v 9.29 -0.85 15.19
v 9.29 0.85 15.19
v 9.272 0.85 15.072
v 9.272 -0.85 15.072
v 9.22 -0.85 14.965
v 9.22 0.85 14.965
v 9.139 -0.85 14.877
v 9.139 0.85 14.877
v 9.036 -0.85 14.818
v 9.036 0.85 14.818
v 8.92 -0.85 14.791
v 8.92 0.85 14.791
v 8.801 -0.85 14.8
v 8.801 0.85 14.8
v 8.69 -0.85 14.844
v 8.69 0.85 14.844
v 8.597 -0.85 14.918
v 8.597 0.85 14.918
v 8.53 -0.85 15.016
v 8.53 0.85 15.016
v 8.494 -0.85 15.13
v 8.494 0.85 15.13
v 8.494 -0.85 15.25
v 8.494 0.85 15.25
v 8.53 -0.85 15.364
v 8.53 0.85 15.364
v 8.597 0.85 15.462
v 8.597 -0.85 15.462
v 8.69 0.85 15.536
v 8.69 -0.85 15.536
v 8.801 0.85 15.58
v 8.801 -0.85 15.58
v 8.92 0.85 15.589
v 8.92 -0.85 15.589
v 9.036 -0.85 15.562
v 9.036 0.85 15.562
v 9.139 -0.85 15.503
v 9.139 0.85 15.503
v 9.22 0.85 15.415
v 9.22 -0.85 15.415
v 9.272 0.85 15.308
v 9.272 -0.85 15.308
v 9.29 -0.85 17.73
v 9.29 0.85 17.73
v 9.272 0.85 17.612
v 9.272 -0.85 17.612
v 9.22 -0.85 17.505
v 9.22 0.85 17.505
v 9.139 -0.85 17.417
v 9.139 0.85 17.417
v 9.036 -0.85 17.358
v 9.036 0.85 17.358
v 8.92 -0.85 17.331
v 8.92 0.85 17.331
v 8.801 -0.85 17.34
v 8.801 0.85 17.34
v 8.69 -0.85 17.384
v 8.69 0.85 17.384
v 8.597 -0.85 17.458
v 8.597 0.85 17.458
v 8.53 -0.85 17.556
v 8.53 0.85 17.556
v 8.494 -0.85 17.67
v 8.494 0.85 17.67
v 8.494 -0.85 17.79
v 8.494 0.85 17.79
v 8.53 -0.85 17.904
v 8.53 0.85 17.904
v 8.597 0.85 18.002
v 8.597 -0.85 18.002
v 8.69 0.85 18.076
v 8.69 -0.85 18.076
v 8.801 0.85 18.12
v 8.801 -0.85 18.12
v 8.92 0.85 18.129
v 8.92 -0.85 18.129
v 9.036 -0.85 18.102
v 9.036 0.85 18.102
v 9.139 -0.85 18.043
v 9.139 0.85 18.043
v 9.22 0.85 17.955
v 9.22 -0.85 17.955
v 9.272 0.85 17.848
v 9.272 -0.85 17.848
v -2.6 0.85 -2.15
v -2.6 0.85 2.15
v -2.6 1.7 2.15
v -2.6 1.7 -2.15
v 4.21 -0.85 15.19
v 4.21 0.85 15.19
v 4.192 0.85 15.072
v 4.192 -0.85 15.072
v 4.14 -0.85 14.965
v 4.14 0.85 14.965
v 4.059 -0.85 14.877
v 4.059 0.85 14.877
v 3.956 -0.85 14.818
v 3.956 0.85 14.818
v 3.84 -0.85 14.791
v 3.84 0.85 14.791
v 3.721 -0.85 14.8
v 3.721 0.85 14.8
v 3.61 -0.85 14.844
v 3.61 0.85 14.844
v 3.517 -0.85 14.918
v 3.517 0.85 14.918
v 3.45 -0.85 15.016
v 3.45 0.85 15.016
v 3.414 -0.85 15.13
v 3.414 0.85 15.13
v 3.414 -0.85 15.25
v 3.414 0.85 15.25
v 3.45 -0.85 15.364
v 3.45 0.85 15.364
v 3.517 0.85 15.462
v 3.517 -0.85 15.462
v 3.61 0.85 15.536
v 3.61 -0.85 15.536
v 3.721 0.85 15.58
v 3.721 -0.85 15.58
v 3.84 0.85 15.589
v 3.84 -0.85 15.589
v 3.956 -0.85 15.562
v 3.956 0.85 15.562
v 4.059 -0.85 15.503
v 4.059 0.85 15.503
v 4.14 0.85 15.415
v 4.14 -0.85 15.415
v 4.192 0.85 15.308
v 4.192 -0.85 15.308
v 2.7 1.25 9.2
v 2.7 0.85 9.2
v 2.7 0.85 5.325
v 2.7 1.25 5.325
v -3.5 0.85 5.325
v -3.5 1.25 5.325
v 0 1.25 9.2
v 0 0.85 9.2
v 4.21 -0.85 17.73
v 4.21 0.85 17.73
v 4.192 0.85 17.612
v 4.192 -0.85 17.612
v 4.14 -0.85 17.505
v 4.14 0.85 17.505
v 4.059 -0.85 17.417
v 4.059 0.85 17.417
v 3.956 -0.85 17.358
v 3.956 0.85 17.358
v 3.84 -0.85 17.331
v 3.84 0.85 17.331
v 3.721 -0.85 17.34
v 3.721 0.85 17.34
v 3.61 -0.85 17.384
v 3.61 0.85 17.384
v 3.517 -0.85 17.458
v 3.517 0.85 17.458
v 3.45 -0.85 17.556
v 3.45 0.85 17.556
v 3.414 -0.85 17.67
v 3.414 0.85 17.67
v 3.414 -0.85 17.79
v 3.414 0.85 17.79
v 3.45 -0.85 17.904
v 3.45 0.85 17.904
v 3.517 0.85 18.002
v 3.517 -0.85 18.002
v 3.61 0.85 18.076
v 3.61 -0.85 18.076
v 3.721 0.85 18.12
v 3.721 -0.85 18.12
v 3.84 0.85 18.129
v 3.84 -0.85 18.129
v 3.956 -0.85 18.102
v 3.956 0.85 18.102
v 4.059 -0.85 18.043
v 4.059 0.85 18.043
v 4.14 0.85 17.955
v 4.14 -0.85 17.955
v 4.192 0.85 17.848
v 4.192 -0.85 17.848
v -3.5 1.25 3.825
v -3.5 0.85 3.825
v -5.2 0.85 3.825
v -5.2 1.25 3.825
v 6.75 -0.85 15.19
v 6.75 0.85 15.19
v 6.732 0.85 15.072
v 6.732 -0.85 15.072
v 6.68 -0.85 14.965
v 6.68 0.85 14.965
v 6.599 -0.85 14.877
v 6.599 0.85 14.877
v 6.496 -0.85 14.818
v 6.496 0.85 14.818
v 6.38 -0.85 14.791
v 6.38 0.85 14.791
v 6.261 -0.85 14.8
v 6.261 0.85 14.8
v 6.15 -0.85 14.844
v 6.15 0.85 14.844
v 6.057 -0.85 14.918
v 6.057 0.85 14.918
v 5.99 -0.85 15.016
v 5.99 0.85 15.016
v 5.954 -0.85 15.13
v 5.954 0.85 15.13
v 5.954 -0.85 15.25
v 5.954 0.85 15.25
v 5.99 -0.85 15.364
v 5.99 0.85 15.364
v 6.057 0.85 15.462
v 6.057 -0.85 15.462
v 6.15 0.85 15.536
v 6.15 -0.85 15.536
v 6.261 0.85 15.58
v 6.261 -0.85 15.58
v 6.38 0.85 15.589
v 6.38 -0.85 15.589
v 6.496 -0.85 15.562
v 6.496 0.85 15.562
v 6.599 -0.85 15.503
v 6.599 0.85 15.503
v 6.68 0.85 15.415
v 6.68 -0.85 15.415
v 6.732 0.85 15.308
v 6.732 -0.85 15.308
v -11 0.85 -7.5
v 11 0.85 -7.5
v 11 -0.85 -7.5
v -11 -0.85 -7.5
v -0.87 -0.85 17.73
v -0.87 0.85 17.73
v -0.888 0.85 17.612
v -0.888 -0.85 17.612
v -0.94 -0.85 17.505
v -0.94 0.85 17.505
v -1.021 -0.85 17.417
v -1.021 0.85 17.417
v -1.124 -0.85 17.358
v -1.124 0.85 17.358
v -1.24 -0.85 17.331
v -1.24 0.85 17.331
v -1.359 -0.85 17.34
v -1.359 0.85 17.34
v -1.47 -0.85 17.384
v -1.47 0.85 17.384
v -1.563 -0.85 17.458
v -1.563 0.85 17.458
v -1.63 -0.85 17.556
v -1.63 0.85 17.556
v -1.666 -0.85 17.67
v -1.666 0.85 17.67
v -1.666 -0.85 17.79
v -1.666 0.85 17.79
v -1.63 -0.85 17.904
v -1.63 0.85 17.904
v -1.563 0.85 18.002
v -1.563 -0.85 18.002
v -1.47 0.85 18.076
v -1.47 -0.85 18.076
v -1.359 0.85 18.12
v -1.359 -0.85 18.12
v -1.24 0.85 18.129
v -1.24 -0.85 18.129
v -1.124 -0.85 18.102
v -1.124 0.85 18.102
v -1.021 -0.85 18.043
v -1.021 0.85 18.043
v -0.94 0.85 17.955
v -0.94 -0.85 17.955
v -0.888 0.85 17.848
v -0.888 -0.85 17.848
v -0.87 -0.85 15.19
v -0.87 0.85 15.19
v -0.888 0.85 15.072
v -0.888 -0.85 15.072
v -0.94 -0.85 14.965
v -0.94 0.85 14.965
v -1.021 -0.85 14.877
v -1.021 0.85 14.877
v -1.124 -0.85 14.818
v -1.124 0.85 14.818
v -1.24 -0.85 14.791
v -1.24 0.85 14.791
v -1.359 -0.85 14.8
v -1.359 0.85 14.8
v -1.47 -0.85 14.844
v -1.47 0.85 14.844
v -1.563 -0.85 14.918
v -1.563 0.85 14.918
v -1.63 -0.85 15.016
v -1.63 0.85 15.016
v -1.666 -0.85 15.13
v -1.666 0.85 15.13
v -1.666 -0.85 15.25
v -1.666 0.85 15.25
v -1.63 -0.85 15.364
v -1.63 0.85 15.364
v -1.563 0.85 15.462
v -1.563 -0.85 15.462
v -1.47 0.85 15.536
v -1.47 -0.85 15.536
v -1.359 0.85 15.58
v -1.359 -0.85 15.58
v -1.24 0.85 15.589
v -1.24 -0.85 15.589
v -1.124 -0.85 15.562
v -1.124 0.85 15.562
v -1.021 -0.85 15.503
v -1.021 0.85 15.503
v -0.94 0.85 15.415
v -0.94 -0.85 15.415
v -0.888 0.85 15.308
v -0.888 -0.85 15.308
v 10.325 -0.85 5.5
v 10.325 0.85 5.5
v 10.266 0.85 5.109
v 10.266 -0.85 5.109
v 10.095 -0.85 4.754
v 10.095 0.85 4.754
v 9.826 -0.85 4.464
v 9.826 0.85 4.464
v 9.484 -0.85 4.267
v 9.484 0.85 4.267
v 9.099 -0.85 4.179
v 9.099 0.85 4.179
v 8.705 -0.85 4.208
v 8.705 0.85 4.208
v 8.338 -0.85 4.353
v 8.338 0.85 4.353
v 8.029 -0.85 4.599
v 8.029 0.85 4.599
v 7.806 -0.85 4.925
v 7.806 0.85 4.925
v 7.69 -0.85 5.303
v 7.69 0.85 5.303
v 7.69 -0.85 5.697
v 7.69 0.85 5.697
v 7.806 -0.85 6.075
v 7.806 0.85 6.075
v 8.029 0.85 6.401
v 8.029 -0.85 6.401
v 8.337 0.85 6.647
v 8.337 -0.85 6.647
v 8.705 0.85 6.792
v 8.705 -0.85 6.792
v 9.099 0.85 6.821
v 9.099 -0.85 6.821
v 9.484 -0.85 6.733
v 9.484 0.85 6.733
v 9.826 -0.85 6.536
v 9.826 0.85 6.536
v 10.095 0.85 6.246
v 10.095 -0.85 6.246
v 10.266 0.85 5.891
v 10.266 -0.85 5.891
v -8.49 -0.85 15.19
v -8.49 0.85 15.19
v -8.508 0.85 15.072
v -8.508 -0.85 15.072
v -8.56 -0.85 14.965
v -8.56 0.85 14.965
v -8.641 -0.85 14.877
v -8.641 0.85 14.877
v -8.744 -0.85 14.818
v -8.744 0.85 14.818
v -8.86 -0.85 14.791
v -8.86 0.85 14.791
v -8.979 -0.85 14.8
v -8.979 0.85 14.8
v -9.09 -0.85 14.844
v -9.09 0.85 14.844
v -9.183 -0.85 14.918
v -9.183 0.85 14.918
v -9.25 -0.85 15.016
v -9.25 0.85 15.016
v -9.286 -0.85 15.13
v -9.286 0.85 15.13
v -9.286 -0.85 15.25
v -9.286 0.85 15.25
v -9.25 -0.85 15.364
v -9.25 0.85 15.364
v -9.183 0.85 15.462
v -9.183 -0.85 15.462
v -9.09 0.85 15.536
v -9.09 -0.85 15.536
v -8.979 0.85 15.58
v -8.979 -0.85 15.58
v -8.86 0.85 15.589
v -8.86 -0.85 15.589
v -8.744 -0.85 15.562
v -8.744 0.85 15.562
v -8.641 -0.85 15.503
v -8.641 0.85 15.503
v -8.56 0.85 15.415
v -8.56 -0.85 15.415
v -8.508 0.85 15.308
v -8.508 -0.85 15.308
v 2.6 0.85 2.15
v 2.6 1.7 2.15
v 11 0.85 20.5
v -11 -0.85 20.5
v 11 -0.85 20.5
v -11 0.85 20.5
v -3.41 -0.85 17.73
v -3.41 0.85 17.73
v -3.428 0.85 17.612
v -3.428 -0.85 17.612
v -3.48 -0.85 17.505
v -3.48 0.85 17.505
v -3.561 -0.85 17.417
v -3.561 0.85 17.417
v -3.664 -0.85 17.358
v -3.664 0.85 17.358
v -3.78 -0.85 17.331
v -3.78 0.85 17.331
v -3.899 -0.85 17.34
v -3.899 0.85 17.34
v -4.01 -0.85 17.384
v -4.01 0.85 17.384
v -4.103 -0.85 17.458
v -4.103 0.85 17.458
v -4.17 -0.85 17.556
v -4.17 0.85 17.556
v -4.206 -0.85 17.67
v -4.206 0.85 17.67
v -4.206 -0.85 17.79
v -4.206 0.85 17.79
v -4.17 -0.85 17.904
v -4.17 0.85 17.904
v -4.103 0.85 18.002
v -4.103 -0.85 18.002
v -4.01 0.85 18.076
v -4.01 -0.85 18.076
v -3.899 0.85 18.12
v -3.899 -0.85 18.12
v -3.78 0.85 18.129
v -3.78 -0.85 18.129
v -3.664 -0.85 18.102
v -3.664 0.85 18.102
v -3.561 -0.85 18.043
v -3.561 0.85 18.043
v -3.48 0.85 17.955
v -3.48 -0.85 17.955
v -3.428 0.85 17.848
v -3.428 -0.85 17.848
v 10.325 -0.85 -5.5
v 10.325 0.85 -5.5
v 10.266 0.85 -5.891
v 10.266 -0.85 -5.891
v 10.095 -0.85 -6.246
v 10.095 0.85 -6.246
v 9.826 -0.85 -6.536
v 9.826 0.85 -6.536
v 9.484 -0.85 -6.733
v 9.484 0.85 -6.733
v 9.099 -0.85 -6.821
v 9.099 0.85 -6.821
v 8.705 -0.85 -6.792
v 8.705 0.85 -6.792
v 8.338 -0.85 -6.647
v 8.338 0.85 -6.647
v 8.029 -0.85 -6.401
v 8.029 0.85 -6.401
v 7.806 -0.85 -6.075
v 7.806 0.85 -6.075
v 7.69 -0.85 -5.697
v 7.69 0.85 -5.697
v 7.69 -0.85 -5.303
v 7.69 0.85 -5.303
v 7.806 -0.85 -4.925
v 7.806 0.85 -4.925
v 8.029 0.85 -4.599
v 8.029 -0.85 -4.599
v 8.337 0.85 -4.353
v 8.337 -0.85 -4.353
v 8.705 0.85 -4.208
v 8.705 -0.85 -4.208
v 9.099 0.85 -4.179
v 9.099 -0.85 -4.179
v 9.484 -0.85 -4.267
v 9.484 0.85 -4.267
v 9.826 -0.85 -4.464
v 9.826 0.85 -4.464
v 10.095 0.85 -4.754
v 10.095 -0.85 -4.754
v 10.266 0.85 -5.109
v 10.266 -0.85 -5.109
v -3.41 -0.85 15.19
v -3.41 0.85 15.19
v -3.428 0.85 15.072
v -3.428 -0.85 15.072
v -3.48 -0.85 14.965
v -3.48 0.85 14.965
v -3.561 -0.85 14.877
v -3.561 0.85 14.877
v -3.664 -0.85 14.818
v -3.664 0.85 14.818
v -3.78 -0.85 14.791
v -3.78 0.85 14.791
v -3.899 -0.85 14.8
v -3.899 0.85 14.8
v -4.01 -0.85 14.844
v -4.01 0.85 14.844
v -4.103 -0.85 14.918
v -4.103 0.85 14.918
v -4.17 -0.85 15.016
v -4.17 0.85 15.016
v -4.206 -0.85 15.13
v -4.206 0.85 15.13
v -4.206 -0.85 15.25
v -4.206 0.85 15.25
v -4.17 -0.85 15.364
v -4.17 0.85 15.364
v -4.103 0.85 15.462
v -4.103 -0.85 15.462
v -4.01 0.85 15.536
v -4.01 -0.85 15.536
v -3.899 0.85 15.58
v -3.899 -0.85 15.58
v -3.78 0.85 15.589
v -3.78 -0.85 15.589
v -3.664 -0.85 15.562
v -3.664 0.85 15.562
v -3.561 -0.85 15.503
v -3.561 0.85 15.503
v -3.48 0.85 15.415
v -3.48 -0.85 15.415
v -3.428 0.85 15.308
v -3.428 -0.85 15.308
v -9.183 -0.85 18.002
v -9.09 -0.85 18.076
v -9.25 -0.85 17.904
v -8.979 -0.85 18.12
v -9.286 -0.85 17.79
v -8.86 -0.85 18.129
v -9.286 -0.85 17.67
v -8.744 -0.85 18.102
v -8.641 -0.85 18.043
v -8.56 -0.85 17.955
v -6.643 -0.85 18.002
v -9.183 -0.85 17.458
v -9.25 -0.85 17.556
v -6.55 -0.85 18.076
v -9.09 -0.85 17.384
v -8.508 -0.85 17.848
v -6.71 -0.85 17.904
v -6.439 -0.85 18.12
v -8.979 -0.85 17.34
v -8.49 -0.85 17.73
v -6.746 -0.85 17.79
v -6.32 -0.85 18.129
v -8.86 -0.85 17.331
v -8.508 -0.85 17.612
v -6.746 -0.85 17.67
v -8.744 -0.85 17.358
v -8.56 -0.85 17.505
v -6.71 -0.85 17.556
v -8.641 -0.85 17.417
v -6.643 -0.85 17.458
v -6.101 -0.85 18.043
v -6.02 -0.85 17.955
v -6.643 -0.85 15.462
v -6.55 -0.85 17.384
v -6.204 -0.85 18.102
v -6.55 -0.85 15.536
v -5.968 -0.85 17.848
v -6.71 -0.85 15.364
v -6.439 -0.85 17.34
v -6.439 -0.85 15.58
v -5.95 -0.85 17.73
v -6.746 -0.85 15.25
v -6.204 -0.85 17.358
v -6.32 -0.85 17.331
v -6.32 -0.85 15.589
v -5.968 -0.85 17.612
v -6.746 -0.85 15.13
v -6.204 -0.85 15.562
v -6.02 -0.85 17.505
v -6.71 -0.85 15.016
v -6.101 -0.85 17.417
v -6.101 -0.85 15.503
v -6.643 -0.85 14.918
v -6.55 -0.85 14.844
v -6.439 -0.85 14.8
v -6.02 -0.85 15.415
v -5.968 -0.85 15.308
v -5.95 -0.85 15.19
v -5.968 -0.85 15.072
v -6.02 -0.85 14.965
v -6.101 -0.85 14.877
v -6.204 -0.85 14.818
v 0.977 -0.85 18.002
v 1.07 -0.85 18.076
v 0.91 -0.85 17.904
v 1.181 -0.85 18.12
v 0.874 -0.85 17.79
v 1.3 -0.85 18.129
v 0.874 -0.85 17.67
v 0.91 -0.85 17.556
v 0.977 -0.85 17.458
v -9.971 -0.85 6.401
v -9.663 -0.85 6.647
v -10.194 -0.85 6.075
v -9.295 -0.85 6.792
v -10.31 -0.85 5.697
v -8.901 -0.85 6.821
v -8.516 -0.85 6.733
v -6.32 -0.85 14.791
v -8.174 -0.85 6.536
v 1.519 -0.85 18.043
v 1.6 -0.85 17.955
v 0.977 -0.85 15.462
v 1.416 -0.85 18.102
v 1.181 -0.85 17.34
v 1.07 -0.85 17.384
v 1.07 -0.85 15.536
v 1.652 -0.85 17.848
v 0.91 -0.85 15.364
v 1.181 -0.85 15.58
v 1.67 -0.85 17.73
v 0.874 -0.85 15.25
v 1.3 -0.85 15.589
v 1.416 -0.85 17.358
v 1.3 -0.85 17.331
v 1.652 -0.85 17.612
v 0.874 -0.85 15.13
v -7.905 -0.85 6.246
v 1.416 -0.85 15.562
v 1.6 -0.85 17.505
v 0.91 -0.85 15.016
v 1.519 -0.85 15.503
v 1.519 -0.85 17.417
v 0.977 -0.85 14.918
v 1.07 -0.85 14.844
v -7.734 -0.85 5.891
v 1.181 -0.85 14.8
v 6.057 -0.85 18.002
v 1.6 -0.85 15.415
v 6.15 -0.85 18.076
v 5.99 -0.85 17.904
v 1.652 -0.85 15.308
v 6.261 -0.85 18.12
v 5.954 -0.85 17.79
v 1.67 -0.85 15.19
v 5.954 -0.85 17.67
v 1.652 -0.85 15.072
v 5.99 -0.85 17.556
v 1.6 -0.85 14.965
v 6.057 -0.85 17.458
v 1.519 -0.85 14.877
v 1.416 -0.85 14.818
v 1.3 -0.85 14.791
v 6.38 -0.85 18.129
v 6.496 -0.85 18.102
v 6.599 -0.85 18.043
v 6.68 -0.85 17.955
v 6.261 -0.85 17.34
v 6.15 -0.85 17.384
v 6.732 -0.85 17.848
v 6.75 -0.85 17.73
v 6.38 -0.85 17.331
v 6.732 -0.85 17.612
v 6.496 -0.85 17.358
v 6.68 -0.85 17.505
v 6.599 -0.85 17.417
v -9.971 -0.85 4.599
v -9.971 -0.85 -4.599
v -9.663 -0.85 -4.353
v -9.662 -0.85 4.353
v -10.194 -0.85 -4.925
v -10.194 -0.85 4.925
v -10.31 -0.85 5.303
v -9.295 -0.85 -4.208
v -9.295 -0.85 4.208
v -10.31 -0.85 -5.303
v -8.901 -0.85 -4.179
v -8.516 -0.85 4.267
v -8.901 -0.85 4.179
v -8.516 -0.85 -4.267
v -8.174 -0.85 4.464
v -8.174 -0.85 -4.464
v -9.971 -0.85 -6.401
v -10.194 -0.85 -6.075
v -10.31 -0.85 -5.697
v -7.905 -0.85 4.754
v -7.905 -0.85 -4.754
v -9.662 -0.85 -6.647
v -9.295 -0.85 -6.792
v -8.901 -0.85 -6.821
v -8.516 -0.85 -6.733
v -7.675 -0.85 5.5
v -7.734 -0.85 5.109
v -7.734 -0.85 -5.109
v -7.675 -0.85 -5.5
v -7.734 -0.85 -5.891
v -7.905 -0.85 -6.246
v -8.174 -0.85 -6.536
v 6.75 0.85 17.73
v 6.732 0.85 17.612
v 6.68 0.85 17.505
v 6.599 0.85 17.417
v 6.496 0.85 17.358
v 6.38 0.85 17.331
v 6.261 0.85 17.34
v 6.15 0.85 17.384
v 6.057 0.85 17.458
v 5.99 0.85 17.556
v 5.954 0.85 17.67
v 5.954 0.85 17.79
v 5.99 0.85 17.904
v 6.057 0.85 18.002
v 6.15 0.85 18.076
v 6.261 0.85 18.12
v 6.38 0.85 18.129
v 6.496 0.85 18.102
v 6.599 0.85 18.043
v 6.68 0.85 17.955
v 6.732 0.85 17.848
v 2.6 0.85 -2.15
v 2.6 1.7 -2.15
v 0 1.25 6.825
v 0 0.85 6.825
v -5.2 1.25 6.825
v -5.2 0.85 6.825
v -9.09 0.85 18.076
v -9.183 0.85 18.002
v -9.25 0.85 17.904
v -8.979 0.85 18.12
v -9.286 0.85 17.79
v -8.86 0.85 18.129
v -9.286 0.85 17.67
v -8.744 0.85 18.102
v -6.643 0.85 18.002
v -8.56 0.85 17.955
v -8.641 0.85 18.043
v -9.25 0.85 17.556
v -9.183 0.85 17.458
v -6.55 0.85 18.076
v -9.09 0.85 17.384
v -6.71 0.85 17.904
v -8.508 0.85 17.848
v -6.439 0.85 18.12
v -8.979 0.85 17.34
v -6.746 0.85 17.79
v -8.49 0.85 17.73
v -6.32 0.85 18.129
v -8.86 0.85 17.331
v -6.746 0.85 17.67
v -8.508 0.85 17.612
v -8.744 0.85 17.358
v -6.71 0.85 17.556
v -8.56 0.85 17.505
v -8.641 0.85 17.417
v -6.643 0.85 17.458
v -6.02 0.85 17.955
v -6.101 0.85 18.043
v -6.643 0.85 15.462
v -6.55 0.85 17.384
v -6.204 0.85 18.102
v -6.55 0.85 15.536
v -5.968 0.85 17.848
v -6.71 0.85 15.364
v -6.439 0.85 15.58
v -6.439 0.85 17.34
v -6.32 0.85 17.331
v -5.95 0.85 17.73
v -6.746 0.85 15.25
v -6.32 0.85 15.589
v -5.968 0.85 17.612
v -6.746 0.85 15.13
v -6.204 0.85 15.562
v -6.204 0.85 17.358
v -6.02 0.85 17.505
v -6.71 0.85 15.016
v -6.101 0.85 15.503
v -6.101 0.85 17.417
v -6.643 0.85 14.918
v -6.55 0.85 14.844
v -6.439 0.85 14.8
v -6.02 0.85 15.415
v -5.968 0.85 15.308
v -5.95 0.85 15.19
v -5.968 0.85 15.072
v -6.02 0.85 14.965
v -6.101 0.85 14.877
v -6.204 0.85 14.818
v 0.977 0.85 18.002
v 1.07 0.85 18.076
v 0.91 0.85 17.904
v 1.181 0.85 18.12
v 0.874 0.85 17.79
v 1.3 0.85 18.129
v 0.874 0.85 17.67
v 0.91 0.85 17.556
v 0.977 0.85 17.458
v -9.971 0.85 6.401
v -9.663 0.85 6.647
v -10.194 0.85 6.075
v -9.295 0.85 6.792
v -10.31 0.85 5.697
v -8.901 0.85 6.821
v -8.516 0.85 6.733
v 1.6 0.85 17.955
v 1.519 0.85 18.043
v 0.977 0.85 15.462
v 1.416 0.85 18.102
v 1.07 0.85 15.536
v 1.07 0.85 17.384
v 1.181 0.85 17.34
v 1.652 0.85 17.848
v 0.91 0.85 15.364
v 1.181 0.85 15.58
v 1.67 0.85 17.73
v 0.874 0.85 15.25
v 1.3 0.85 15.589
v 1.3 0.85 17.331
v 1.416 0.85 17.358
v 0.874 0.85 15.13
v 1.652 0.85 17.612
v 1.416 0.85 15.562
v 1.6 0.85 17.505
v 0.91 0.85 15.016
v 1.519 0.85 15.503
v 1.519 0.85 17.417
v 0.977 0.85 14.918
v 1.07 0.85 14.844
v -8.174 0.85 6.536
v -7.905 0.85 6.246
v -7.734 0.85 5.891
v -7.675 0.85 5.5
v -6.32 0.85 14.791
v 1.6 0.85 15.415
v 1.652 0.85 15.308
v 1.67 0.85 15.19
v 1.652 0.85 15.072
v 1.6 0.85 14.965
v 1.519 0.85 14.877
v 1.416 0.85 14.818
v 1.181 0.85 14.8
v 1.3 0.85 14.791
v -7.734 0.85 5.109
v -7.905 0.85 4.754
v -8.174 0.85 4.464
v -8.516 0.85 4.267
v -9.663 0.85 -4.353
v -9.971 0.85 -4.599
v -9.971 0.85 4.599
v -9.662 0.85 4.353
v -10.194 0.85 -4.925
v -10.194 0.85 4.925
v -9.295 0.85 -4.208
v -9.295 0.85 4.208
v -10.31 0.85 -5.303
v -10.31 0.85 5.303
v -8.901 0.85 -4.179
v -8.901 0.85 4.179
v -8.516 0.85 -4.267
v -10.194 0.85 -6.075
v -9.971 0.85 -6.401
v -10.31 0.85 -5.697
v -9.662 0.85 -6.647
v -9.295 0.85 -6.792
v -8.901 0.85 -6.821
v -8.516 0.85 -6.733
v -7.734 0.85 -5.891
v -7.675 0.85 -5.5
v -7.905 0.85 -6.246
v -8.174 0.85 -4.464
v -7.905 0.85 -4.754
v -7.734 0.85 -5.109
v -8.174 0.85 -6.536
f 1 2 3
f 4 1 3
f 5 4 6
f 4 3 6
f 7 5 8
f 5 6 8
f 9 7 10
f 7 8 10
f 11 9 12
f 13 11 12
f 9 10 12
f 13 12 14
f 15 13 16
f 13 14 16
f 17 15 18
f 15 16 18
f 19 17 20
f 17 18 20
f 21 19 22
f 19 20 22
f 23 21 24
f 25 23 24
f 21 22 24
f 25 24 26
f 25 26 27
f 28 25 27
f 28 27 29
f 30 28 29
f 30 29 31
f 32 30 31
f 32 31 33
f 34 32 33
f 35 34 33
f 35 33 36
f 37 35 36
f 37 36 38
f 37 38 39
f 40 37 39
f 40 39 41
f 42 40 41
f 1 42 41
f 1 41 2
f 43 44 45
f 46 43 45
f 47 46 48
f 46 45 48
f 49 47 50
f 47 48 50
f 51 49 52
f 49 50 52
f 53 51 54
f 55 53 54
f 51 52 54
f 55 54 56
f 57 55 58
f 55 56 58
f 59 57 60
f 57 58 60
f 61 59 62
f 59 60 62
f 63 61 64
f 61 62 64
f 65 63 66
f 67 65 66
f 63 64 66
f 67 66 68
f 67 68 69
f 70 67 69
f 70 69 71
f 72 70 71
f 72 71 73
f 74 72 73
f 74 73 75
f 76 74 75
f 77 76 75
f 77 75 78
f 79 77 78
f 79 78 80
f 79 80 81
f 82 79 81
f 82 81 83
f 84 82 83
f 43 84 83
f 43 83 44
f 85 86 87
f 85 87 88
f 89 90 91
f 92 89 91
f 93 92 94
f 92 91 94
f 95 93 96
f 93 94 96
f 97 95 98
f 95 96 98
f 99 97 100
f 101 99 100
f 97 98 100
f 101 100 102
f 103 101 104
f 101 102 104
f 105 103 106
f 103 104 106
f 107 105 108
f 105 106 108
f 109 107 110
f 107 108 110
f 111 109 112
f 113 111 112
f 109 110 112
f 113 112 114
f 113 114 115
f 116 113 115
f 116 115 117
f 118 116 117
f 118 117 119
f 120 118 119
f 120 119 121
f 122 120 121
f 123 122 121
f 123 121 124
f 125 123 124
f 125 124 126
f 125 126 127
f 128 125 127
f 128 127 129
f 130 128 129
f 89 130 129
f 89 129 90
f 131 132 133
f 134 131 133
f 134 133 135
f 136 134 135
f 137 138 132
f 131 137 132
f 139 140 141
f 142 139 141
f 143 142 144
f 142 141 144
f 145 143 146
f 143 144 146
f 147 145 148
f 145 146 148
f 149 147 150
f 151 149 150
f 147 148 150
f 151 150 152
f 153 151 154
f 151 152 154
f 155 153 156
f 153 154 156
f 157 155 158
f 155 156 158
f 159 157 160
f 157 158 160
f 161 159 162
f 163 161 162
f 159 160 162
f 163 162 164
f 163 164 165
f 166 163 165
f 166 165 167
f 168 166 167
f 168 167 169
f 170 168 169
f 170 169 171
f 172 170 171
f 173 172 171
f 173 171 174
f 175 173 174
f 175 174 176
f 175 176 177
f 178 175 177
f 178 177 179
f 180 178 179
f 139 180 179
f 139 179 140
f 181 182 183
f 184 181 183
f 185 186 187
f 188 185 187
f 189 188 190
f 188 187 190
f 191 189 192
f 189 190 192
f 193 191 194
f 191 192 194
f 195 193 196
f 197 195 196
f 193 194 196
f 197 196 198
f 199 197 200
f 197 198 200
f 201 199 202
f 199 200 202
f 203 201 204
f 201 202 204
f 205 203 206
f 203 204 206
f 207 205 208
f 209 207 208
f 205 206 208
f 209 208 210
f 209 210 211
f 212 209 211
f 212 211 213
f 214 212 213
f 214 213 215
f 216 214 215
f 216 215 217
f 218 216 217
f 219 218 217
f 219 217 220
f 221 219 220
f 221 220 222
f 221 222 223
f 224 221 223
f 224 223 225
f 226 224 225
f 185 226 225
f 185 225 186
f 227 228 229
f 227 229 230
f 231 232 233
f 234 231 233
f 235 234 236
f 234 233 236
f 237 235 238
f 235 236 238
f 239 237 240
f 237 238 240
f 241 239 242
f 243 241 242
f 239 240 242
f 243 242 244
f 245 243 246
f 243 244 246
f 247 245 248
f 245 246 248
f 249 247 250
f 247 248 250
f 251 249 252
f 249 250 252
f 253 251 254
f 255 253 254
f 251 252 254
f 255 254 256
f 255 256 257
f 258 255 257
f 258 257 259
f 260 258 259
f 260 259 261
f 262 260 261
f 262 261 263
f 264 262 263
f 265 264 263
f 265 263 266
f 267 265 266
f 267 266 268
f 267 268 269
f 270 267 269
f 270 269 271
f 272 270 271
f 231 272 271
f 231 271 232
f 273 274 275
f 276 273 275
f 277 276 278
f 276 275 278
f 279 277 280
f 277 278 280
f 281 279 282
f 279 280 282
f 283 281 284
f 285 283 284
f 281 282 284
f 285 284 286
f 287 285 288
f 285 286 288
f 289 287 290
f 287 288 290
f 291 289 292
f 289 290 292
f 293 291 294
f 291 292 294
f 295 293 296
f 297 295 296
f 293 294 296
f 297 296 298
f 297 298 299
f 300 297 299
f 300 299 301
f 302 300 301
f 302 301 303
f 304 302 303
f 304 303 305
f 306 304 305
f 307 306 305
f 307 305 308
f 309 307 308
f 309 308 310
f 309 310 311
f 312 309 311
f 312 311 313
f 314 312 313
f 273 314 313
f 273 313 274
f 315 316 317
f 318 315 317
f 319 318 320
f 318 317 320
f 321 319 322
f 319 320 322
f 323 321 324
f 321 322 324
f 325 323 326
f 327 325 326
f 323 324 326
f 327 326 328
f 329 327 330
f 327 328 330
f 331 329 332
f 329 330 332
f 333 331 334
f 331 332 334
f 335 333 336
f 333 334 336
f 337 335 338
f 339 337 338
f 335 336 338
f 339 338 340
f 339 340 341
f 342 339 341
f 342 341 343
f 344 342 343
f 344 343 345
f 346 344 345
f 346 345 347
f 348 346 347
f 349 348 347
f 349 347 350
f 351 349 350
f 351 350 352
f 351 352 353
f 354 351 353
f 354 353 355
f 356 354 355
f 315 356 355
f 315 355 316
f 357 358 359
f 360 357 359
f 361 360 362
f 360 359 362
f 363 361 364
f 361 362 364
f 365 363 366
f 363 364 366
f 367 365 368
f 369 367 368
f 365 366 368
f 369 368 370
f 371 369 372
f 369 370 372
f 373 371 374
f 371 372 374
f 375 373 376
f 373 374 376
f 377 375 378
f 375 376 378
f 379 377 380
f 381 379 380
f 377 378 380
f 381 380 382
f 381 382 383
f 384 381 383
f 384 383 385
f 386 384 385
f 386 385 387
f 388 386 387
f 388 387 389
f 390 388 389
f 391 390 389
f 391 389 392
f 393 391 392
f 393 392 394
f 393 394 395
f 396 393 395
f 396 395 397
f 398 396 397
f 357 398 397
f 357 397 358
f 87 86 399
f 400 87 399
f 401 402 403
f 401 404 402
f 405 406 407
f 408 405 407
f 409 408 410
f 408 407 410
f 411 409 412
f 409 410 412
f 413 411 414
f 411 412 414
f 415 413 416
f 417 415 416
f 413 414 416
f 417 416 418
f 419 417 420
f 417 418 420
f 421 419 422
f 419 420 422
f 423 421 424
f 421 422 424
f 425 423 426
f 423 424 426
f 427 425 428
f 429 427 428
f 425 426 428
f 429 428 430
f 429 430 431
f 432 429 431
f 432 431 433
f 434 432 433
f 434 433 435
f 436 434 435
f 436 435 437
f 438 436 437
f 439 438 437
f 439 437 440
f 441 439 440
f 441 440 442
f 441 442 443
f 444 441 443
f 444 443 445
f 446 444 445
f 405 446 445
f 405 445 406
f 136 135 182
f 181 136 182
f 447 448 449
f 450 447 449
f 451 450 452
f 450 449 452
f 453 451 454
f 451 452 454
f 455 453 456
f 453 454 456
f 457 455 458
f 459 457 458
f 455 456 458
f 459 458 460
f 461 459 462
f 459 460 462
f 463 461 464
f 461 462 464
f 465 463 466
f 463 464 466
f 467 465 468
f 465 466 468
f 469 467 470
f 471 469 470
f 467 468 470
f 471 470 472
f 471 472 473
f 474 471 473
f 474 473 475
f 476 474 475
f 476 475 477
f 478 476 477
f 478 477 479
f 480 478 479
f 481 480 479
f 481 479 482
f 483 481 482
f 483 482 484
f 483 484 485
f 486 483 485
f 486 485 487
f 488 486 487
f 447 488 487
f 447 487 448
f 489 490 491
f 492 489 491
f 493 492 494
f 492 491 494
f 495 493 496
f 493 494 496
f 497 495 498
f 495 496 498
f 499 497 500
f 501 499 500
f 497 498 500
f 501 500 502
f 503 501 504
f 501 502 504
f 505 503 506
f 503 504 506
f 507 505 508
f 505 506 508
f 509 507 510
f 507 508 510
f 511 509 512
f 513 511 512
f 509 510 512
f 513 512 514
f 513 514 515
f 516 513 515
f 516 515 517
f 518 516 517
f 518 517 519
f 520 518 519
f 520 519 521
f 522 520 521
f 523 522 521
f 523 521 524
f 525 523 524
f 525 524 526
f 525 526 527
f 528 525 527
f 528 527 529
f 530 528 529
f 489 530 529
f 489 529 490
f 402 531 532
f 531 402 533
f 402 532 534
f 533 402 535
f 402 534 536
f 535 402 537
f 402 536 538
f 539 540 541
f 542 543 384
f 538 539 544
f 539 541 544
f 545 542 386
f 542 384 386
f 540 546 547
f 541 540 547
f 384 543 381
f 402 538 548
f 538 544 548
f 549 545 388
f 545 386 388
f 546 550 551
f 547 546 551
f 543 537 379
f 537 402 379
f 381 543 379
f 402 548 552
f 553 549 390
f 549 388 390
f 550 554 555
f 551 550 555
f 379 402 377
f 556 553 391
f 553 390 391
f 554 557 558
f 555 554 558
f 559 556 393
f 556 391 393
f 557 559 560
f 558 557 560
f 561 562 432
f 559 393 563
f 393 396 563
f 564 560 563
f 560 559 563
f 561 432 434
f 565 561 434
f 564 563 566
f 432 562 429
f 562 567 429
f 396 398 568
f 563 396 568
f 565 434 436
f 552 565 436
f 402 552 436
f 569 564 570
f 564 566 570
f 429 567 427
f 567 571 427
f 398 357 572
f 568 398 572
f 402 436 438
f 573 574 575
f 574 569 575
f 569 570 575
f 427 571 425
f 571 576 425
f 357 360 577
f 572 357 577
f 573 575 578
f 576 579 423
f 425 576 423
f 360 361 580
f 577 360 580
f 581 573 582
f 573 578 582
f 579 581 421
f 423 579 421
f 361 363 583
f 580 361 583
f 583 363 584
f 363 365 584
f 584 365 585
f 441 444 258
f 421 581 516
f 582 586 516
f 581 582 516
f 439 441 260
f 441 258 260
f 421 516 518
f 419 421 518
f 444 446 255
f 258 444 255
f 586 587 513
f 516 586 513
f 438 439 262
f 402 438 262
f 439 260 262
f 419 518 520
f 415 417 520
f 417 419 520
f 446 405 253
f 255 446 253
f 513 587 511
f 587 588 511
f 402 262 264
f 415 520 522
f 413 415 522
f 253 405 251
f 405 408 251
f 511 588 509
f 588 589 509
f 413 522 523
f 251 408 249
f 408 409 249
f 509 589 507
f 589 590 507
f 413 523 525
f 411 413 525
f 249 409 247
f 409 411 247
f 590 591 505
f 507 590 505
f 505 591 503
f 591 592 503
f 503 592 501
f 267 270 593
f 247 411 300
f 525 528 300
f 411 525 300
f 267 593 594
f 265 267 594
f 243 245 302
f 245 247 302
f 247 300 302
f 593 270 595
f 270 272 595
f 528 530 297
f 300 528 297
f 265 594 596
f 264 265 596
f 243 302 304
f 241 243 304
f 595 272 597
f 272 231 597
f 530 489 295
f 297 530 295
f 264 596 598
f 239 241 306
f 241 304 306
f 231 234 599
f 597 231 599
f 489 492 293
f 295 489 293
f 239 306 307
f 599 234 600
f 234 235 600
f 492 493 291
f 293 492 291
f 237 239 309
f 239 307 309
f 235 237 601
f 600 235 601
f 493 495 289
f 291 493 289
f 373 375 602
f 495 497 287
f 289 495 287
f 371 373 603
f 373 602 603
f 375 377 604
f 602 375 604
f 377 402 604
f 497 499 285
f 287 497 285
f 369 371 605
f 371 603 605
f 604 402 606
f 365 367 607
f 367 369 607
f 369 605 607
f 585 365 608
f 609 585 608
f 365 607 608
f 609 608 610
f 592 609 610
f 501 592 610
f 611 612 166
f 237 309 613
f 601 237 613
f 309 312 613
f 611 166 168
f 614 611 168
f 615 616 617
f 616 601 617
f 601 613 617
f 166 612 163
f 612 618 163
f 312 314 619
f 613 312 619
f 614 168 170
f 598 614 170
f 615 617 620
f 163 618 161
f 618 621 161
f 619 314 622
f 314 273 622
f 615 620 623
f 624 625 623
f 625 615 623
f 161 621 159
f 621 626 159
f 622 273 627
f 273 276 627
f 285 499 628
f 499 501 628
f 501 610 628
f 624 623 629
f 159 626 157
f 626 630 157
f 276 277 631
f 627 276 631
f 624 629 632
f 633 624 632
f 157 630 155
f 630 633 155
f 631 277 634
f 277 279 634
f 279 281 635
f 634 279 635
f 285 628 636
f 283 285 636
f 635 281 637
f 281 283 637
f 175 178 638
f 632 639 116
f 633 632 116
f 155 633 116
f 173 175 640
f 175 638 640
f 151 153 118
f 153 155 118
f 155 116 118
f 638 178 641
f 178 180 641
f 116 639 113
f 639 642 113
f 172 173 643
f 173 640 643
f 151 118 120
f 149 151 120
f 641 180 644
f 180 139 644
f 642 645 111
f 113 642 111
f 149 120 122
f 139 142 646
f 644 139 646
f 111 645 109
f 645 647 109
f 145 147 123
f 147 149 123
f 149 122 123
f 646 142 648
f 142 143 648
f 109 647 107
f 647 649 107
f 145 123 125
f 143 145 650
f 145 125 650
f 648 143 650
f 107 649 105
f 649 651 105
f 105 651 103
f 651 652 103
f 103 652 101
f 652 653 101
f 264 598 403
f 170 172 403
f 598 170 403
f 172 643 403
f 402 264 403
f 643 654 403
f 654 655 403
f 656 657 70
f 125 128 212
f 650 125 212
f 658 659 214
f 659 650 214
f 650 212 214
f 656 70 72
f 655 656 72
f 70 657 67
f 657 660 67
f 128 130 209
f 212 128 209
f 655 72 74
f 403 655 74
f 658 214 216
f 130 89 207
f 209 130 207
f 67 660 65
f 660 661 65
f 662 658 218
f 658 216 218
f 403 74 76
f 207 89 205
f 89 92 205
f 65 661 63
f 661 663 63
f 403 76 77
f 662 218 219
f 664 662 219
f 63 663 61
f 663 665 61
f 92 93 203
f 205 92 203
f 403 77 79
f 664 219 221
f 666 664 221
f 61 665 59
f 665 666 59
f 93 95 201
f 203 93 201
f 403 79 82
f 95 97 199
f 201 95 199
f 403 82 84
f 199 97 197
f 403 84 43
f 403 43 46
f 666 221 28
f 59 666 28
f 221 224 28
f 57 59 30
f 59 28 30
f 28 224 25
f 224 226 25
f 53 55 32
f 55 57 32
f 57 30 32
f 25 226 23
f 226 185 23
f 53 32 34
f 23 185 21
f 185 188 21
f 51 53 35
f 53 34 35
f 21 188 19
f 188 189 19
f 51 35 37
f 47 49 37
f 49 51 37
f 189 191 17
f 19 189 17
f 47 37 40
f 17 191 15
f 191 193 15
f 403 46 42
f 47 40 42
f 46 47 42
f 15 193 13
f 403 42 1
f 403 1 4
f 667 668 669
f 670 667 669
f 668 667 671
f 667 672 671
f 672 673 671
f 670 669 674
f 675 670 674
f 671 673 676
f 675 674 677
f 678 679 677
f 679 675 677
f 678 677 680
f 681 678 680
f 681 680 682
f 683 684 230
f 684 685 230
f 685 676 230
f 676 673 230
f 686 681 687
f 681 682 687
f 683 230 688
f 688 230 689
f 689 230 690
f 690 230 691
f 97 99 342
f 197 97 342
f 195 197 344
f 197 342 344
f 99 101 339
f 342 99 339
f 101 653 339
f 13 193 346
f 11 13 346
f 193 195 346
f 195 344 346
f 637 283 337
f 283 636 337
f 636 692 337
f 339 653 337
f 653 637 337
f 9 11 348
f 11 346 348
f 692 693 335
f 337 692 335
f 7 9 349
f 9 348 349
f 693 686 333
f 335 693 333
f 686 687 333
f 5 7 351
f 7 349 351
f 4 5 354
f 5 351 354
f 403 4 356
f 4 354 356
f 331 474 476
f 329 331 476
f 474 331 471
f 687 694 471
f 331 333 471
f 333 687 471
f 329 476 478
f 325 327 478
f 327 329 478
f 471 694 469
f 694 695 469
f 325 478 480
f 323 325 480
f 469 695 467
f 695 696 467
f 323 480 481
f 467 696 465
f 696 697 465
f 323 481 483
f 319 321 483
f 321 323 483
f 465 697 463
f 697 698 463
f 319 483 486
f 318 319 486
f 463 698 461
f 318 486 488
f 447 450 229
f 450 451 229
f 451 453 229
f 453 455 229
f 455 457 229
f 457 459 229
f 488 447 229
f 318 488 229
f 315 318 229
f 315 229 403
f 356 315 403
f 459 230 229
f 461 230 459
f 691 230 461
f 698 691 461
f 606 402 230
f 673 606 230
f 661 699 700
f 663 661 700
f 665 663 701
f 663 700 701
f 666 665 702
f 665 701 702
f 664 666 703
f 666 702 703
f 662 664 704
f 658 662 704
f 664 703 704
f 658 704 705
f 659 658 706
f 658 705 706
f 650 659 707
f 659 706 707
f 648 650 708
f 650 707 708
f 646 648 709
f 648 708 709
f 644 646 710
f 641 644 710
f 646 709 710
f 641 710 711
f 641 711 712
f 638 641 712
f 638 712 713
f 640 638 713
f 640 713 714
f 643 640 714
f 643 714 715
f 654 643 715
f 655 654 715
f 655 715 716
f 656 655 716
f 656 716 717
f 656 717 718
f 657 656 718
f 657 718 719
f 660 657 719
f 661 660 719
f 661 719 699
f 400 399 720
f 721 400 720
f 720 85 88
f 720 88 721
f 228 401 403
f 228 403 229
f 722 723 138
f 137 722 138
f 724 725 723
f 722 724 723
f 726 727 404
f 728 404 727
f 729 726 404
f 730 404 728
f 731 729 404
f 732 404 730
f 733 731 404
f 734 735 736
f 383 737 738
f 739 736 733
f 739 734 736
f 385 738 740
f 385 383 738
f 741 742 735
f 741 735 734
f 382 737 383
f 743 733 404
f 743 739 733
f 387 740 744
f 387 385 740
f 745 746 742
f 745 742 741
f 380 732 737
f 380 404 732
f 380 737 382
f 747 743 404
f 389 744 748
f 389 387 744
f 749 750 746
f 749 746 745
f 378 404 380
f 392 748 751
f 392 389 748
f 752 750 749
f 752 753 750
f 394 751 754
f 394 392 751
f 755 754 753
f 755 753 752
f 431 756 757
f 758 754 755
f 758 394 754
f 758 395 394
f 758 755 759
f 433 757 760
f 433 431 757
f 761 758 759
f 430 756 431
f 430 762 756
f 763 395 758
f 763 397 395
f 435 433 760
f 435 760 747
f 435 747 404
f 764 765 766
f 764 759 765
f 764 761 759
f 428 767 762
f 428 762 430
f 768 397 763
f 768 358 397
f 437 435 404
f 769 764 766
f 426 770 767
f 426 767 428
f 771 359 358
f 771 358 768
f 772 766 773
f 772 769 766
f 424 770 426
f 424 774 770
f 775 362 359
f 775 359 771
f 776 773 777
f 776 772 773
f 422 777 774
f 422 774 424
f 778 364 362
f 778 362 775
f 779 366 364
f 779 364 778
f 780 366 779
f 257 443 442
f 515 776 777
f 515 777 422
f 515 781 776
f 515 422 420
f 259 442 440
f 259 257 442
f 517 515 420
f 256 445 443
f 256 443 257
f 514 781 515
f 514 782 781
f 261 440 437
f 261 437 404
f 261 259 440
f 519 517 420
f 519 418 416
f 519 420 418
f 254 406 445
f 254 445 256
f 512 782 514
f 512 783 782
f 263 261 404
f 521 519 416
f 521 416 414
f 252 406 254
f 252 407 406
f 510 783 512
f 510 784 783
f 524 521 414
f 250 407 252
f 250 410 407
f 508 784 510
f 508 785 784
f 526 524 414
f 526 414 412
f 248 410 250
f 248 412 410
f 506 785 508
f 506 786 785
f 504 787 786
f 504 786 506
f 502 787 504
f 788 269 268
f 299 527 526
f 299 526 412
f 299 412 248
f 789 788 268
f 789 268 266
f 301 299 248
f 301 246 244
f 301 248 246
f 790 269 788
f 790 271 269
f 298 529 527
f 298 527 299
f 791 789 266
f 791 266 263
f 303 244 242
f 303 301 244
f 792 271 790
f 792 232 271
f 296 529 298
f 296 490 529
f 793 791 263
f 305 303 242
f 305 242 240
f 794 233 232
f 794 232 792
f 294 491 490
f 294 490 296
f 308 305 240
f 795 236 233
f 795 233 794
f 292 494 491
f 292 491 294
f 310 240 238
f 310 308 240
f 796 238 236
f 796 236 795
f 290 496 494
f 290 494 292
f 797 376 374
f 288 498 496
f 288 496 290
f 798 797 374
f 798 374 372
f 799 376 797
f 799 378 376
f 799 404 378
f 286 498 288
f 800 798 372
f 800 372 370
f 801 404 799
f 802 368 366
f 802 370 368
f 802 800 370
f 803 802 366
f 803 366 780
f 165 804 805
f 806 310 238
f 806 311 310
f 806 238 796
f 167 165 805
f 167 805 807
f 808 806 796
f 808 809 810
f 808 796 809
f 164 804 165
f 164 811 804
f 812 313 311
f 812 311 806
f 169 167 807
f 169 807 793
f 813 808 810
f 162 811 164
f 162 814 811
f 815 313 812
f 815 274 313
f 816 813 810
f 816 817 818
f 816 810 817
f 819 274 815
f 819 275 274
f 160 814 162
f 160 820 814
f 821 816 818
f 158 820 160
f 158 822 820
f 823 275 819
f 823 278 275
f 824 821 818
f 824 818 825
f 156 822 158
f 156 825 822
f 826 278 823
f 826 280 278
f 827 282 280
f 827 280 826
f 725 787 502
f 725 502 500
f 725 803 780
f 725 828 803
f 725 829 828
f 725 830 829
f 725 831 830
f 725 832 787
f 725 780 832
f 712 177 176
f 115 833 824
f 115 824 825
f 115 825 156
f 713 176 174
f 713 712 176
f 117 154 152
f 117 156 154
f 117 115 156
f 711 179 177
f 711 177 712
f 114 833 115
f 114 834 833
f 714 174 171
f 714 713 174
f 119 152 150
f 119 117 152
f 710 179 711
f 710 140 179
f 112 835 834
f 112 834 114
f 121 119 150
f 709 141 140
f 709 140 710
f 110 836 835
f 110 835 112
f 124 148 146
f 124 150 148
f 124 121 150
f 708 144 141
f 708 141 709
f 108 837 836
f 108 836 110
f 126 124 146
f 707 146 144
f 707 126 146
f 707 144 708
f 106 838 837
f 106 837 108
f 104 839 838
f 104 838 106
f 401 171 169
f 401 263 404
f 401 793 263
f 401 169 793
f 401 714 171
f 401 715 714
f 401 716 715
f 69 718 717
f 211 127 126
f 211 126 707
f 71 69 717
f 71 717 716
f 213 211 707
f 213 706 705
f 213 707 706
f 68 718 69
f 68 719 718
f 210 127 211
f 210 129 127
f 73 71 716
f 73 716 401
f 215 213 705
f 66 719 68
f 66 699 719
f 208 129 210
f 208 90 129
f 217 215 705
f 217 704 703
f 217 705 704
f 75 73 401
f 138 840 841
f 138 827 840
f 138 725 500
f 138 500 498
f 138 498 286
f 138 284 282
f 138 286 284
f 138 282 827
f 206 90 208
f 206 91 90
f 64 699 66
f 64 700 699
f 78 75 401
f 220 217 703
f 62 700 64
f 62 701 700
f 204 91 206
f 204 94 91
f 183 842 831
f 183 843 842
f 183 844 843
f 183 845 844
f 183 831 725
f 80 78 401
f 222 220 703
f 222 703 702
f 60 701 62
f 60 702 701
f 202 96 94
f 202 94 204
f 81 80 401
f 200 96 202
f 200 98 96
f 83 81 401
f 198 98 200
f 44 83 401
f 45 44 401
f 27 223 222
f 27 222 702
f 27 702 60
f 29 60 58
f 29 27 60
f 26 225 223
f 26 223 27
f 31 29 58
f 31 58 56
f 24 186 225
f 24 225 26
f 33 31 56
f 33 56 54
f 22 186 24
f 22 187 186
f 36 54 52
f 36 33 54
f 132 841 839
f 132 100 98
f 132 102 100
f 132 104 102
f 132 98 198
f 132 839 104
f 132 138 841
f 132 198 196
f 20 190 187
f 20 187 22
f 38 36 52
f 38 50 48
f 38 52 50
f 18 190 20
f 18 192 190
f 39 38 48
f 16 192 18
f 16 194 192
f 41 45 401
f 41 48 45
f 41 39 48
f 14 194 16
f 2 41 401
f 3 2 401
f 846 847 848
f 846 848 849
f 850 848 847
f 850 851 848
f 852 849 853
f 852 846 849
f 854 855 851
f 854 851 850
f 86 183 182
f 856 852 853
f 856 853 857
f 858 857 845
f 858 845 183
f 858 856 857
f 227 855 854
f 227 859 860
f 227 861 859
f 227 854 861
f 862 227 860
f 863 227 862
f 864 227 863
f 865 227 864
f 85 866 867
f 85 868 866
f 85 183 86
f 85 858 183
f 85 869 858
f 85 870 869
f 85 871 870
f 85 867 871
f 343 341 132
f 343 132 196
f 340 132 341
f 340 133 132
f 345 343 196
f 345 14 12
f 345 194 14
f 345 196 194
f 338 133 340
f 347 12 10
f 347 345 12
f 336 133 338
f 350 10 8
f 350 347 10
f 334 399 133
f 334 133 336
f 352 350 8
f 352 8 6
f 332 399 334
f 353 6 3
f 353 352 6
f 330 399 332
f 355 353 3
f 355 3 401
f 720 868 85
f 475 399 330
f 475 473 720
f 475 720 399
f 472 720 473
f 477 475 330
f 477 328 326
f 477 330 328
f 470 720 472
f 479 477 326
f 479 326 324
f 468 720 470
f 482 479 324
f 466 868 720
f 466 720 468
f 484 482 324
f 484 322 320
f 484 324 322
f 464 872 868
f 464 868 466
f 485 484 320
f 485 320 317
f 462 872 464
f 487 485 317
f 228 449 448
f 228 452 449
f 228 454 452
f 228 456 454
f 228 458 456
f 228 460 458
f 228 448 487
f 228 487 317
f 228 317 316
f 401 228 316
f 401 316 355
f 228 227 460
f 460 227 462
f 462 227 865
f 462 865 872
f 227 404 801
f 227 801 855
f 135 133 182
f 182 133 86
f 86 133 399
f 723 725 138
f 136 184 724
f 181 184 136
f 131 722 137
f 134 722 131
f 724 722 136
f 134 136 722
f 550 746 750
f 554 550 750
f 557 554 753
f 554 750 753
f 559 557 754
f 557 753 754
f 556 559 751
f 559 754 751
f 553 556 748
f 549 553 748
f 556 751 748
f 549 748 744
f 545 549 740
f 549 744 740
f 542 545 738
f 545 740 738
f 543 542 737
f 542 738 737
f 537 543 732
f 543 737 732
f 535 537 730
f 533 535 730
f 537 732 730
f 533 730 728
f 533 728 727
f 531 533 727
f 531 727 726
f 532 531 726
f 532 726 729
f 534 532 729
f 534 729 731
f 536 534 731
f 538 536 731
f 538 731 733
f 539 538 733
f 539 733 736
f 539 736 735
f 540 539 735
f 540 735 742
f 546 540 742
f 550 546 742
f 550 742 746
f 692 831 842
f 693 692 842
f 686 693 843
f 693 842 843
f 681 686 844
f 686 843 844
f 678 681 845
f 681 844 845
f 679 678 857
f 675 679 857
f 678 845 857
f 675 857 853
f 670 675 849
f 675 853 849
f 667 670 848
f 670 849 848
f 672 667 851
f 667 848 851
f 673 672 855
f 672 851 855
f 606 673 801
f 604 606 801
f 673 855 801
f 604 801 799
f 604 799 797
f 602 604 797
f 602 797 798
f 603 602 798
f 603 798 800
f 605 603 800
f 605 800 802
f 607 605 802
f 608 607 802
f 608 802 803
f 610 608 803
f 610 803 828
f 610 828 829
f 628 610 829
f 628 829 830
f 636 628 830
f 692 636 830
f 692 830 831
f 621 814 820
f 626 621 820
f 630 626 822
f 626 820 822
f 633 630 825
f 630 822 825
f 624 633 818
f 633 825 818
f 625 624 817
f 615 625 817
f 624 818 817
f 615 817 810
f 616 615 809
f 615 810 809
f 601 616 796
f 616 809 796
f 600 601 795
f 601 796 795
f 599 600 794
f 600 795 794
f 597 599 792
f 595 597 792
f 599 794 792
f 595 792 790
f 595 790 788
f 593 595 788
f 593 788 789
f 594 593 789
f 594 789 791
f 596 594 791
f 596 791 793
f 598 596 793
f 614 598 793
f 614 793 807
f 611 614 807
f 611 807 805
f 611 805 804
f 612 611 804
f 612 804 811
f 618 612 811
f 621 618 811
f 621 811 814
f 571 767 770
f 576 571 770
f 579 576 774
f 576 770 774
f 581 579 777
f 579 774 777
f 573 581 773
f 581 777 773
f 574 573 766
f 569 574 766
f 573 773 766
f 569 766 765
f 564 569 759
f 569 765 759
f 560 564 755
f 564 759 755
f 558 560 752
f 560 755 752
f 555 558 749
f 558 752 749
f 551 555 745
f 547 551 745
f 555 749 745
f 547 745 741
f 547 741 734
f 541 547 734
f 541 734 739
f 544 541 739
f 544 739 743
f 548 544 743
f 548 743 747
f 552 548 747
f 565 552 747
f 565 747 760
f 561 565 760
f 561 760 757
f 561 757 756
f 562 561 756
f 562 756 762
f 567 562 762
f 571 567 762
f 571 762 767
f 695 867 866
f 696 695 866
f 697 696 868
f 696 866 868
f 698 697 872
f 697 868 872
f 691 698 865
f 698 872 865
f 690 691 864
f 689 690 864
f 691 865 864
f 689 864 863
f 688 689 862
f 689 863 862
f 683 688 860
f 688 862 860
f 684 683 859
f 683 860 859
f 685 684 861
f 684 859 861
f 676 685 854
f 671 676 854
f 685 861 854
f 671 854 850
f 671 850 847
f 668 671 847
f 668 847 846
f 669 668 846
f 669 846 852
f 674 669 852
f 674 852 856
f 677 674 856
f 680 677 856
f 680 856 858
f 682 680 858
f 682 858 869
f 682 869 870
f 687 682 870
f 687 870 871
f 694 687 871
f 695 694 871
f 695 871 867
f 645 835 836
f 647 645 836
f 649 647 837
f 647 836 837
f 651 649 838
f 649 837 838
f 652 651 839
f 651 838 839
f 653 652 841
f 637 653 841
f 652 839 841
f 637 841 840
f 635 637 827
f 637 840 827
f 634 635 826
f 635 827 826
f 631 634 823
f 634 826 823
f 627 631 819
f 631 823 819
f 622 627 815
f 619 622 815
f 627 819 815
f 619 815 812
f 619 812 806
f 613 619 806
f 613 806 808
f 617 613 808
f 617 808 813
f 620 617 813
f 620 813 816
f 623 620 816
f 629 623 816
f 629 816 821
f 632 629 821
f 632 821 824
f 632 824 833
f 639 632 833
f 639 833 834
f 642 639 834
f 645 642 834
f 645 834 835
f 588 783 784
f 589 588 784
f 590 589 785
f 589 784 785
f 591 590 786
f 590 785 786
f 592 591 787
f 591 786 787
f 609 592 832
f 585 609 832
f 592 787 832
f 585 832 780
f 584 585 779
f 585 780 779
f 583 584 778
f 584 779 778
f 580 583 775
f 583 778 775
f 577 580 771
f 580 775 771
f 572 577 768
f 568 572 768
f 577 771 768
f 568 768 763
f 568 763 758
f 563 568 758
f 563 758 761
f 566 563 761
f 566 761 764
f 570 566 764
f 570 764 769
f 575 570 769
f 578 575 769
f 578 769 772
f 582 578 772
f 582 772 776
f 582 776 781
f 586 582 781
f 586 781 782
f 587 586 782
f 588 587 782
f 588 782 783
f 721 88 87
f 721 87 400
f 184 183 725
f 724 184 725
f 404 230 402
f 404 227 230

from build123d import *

# Parameters (mm, degrees)
BOSS_EXTRUDE1_DEPTH = 0.85
SKETCH2_R           = 1.325
SKETCH2_R_2         = 0.4
CUT_EXTRUDE1_DEPTH  = 2.7
SKETCH3_W           = 5.2
SKETCH3_H           = 4.3
BOSS_EXTRUDE2_DEPTH = 0.85
BOSS_EXTRUDE3_DEPTH = 0.4


with BuildPart() as part:
    # Sketch1 → Boss-Extrude1 (new body, symmetric)
    with BuildSketch(Plane(origin=(0, 0, 0), x_dir=(1, 0, 0), z_dir=(0, 1, 0))):
        Polygon((-11, -7.5), (-11, -20.5), (11, -20.5), (11, -7.5), (11, 7.5), (-11, 7.5), align=None)
    extrude(amount=BOSS_EXTRUDE1_DEPTH, both=True)

    # Sketch2 → Cut-Extrude1 (cut, through all)
    with BuildSketch(Plane(origin=(0, 0.85, 0), x_dir=(1, 0, 0), z_dir=(0, 1, 0))):
        with Locations((-9, 5.5)):
            Circle(SKETCH2_R)
        with Locations((9, 5.5)):
            Circle(SKETCH2_R)
        with Locations((9, -5.5)):
            Circle(SKETCH2_R)
        with Locations((-9, -5.5)):
            Circle(SKETCH2_R)
        with Locations((-8.89, -15.19)):
            Circle(SKETCH2_R_2)
        with Locations((-6.35, -15.19)):
            Circle(SKETCH2_R_2)
        with Locations((-3.81, -15.19)):
            Circle(SKETCH2_R_2)
        with Locations((-1.27, -15.19)):
            Circle(SKETCH2_R_2)
        with Locations((1.27, -15.19)):
            Circle(SKETCH2_R_2)
        with Locations((3.81, -15.19)):
            Circle(SKETCH2_R_2)
        with Locations((6.35, -15.19)):
            Circle(SKETCH2_R_2)
        with Locations((8.89, -15.19)):
            Circle(SKETCH2_R_2)
        with Locations((-6.35, -17.73)):
            Circle(SKETCH2_R_2)
        with Locations((-3.81, -17.73)):
            Circle(SKETCH2_R_2)
        with Locations((-1.27, -17.73)):
            Circle(SKETCH2_R_2)
        with Locations((1.27, -17.73)):
            Circle(SKETCH2_R_2)
        with Locations((3.81, -17.73)):
            Circle(SKETCH2_R_2)
        with Locations((6.35, -17.73)):
            Circle(SKETCH2_R_2)
        with Locations((8.89, -17.73)):
            Circle(SKETCH2_R_2)
        with Locations((-8.89, -17.73)):
            Circle(SKETCH2_R_2)
    extrude(amount=-CUT_EXTRUDE1_DEPTH, mode=Mode.SUBTRACT)

    # Sketch3 → Boss-Extrude2 (add)
    with BuildSketch(Plane(origin=(0, 0.85, 0), x_dir=(1, 0, 0), z_dir=(0, 1, 0))):
        Rectangle(SKETCH3_W, SKETCH3_H)
    extrude(amount=BOSS_EXTRUDE2_DEPTH)

    # Sketch3<3> → Boss-Extrude3 (add)
    with BuildSketch(Plane(origin=(0, 0.85, 0), x_dir=(1, 0, 0), z_dir=(0, 1, 0))):
        Polygon((-5.2, -3.825), (-5.2, -6.825), (0, -6.825), (0, -9.2), (2.7, -9.2), (2.7, -5.325), (-3.5, -5.325), (-3.5, -3.825), align=None)
    extrude(amount=BOSS_EXTRUDE3_DEPTH)


solid = part.part
